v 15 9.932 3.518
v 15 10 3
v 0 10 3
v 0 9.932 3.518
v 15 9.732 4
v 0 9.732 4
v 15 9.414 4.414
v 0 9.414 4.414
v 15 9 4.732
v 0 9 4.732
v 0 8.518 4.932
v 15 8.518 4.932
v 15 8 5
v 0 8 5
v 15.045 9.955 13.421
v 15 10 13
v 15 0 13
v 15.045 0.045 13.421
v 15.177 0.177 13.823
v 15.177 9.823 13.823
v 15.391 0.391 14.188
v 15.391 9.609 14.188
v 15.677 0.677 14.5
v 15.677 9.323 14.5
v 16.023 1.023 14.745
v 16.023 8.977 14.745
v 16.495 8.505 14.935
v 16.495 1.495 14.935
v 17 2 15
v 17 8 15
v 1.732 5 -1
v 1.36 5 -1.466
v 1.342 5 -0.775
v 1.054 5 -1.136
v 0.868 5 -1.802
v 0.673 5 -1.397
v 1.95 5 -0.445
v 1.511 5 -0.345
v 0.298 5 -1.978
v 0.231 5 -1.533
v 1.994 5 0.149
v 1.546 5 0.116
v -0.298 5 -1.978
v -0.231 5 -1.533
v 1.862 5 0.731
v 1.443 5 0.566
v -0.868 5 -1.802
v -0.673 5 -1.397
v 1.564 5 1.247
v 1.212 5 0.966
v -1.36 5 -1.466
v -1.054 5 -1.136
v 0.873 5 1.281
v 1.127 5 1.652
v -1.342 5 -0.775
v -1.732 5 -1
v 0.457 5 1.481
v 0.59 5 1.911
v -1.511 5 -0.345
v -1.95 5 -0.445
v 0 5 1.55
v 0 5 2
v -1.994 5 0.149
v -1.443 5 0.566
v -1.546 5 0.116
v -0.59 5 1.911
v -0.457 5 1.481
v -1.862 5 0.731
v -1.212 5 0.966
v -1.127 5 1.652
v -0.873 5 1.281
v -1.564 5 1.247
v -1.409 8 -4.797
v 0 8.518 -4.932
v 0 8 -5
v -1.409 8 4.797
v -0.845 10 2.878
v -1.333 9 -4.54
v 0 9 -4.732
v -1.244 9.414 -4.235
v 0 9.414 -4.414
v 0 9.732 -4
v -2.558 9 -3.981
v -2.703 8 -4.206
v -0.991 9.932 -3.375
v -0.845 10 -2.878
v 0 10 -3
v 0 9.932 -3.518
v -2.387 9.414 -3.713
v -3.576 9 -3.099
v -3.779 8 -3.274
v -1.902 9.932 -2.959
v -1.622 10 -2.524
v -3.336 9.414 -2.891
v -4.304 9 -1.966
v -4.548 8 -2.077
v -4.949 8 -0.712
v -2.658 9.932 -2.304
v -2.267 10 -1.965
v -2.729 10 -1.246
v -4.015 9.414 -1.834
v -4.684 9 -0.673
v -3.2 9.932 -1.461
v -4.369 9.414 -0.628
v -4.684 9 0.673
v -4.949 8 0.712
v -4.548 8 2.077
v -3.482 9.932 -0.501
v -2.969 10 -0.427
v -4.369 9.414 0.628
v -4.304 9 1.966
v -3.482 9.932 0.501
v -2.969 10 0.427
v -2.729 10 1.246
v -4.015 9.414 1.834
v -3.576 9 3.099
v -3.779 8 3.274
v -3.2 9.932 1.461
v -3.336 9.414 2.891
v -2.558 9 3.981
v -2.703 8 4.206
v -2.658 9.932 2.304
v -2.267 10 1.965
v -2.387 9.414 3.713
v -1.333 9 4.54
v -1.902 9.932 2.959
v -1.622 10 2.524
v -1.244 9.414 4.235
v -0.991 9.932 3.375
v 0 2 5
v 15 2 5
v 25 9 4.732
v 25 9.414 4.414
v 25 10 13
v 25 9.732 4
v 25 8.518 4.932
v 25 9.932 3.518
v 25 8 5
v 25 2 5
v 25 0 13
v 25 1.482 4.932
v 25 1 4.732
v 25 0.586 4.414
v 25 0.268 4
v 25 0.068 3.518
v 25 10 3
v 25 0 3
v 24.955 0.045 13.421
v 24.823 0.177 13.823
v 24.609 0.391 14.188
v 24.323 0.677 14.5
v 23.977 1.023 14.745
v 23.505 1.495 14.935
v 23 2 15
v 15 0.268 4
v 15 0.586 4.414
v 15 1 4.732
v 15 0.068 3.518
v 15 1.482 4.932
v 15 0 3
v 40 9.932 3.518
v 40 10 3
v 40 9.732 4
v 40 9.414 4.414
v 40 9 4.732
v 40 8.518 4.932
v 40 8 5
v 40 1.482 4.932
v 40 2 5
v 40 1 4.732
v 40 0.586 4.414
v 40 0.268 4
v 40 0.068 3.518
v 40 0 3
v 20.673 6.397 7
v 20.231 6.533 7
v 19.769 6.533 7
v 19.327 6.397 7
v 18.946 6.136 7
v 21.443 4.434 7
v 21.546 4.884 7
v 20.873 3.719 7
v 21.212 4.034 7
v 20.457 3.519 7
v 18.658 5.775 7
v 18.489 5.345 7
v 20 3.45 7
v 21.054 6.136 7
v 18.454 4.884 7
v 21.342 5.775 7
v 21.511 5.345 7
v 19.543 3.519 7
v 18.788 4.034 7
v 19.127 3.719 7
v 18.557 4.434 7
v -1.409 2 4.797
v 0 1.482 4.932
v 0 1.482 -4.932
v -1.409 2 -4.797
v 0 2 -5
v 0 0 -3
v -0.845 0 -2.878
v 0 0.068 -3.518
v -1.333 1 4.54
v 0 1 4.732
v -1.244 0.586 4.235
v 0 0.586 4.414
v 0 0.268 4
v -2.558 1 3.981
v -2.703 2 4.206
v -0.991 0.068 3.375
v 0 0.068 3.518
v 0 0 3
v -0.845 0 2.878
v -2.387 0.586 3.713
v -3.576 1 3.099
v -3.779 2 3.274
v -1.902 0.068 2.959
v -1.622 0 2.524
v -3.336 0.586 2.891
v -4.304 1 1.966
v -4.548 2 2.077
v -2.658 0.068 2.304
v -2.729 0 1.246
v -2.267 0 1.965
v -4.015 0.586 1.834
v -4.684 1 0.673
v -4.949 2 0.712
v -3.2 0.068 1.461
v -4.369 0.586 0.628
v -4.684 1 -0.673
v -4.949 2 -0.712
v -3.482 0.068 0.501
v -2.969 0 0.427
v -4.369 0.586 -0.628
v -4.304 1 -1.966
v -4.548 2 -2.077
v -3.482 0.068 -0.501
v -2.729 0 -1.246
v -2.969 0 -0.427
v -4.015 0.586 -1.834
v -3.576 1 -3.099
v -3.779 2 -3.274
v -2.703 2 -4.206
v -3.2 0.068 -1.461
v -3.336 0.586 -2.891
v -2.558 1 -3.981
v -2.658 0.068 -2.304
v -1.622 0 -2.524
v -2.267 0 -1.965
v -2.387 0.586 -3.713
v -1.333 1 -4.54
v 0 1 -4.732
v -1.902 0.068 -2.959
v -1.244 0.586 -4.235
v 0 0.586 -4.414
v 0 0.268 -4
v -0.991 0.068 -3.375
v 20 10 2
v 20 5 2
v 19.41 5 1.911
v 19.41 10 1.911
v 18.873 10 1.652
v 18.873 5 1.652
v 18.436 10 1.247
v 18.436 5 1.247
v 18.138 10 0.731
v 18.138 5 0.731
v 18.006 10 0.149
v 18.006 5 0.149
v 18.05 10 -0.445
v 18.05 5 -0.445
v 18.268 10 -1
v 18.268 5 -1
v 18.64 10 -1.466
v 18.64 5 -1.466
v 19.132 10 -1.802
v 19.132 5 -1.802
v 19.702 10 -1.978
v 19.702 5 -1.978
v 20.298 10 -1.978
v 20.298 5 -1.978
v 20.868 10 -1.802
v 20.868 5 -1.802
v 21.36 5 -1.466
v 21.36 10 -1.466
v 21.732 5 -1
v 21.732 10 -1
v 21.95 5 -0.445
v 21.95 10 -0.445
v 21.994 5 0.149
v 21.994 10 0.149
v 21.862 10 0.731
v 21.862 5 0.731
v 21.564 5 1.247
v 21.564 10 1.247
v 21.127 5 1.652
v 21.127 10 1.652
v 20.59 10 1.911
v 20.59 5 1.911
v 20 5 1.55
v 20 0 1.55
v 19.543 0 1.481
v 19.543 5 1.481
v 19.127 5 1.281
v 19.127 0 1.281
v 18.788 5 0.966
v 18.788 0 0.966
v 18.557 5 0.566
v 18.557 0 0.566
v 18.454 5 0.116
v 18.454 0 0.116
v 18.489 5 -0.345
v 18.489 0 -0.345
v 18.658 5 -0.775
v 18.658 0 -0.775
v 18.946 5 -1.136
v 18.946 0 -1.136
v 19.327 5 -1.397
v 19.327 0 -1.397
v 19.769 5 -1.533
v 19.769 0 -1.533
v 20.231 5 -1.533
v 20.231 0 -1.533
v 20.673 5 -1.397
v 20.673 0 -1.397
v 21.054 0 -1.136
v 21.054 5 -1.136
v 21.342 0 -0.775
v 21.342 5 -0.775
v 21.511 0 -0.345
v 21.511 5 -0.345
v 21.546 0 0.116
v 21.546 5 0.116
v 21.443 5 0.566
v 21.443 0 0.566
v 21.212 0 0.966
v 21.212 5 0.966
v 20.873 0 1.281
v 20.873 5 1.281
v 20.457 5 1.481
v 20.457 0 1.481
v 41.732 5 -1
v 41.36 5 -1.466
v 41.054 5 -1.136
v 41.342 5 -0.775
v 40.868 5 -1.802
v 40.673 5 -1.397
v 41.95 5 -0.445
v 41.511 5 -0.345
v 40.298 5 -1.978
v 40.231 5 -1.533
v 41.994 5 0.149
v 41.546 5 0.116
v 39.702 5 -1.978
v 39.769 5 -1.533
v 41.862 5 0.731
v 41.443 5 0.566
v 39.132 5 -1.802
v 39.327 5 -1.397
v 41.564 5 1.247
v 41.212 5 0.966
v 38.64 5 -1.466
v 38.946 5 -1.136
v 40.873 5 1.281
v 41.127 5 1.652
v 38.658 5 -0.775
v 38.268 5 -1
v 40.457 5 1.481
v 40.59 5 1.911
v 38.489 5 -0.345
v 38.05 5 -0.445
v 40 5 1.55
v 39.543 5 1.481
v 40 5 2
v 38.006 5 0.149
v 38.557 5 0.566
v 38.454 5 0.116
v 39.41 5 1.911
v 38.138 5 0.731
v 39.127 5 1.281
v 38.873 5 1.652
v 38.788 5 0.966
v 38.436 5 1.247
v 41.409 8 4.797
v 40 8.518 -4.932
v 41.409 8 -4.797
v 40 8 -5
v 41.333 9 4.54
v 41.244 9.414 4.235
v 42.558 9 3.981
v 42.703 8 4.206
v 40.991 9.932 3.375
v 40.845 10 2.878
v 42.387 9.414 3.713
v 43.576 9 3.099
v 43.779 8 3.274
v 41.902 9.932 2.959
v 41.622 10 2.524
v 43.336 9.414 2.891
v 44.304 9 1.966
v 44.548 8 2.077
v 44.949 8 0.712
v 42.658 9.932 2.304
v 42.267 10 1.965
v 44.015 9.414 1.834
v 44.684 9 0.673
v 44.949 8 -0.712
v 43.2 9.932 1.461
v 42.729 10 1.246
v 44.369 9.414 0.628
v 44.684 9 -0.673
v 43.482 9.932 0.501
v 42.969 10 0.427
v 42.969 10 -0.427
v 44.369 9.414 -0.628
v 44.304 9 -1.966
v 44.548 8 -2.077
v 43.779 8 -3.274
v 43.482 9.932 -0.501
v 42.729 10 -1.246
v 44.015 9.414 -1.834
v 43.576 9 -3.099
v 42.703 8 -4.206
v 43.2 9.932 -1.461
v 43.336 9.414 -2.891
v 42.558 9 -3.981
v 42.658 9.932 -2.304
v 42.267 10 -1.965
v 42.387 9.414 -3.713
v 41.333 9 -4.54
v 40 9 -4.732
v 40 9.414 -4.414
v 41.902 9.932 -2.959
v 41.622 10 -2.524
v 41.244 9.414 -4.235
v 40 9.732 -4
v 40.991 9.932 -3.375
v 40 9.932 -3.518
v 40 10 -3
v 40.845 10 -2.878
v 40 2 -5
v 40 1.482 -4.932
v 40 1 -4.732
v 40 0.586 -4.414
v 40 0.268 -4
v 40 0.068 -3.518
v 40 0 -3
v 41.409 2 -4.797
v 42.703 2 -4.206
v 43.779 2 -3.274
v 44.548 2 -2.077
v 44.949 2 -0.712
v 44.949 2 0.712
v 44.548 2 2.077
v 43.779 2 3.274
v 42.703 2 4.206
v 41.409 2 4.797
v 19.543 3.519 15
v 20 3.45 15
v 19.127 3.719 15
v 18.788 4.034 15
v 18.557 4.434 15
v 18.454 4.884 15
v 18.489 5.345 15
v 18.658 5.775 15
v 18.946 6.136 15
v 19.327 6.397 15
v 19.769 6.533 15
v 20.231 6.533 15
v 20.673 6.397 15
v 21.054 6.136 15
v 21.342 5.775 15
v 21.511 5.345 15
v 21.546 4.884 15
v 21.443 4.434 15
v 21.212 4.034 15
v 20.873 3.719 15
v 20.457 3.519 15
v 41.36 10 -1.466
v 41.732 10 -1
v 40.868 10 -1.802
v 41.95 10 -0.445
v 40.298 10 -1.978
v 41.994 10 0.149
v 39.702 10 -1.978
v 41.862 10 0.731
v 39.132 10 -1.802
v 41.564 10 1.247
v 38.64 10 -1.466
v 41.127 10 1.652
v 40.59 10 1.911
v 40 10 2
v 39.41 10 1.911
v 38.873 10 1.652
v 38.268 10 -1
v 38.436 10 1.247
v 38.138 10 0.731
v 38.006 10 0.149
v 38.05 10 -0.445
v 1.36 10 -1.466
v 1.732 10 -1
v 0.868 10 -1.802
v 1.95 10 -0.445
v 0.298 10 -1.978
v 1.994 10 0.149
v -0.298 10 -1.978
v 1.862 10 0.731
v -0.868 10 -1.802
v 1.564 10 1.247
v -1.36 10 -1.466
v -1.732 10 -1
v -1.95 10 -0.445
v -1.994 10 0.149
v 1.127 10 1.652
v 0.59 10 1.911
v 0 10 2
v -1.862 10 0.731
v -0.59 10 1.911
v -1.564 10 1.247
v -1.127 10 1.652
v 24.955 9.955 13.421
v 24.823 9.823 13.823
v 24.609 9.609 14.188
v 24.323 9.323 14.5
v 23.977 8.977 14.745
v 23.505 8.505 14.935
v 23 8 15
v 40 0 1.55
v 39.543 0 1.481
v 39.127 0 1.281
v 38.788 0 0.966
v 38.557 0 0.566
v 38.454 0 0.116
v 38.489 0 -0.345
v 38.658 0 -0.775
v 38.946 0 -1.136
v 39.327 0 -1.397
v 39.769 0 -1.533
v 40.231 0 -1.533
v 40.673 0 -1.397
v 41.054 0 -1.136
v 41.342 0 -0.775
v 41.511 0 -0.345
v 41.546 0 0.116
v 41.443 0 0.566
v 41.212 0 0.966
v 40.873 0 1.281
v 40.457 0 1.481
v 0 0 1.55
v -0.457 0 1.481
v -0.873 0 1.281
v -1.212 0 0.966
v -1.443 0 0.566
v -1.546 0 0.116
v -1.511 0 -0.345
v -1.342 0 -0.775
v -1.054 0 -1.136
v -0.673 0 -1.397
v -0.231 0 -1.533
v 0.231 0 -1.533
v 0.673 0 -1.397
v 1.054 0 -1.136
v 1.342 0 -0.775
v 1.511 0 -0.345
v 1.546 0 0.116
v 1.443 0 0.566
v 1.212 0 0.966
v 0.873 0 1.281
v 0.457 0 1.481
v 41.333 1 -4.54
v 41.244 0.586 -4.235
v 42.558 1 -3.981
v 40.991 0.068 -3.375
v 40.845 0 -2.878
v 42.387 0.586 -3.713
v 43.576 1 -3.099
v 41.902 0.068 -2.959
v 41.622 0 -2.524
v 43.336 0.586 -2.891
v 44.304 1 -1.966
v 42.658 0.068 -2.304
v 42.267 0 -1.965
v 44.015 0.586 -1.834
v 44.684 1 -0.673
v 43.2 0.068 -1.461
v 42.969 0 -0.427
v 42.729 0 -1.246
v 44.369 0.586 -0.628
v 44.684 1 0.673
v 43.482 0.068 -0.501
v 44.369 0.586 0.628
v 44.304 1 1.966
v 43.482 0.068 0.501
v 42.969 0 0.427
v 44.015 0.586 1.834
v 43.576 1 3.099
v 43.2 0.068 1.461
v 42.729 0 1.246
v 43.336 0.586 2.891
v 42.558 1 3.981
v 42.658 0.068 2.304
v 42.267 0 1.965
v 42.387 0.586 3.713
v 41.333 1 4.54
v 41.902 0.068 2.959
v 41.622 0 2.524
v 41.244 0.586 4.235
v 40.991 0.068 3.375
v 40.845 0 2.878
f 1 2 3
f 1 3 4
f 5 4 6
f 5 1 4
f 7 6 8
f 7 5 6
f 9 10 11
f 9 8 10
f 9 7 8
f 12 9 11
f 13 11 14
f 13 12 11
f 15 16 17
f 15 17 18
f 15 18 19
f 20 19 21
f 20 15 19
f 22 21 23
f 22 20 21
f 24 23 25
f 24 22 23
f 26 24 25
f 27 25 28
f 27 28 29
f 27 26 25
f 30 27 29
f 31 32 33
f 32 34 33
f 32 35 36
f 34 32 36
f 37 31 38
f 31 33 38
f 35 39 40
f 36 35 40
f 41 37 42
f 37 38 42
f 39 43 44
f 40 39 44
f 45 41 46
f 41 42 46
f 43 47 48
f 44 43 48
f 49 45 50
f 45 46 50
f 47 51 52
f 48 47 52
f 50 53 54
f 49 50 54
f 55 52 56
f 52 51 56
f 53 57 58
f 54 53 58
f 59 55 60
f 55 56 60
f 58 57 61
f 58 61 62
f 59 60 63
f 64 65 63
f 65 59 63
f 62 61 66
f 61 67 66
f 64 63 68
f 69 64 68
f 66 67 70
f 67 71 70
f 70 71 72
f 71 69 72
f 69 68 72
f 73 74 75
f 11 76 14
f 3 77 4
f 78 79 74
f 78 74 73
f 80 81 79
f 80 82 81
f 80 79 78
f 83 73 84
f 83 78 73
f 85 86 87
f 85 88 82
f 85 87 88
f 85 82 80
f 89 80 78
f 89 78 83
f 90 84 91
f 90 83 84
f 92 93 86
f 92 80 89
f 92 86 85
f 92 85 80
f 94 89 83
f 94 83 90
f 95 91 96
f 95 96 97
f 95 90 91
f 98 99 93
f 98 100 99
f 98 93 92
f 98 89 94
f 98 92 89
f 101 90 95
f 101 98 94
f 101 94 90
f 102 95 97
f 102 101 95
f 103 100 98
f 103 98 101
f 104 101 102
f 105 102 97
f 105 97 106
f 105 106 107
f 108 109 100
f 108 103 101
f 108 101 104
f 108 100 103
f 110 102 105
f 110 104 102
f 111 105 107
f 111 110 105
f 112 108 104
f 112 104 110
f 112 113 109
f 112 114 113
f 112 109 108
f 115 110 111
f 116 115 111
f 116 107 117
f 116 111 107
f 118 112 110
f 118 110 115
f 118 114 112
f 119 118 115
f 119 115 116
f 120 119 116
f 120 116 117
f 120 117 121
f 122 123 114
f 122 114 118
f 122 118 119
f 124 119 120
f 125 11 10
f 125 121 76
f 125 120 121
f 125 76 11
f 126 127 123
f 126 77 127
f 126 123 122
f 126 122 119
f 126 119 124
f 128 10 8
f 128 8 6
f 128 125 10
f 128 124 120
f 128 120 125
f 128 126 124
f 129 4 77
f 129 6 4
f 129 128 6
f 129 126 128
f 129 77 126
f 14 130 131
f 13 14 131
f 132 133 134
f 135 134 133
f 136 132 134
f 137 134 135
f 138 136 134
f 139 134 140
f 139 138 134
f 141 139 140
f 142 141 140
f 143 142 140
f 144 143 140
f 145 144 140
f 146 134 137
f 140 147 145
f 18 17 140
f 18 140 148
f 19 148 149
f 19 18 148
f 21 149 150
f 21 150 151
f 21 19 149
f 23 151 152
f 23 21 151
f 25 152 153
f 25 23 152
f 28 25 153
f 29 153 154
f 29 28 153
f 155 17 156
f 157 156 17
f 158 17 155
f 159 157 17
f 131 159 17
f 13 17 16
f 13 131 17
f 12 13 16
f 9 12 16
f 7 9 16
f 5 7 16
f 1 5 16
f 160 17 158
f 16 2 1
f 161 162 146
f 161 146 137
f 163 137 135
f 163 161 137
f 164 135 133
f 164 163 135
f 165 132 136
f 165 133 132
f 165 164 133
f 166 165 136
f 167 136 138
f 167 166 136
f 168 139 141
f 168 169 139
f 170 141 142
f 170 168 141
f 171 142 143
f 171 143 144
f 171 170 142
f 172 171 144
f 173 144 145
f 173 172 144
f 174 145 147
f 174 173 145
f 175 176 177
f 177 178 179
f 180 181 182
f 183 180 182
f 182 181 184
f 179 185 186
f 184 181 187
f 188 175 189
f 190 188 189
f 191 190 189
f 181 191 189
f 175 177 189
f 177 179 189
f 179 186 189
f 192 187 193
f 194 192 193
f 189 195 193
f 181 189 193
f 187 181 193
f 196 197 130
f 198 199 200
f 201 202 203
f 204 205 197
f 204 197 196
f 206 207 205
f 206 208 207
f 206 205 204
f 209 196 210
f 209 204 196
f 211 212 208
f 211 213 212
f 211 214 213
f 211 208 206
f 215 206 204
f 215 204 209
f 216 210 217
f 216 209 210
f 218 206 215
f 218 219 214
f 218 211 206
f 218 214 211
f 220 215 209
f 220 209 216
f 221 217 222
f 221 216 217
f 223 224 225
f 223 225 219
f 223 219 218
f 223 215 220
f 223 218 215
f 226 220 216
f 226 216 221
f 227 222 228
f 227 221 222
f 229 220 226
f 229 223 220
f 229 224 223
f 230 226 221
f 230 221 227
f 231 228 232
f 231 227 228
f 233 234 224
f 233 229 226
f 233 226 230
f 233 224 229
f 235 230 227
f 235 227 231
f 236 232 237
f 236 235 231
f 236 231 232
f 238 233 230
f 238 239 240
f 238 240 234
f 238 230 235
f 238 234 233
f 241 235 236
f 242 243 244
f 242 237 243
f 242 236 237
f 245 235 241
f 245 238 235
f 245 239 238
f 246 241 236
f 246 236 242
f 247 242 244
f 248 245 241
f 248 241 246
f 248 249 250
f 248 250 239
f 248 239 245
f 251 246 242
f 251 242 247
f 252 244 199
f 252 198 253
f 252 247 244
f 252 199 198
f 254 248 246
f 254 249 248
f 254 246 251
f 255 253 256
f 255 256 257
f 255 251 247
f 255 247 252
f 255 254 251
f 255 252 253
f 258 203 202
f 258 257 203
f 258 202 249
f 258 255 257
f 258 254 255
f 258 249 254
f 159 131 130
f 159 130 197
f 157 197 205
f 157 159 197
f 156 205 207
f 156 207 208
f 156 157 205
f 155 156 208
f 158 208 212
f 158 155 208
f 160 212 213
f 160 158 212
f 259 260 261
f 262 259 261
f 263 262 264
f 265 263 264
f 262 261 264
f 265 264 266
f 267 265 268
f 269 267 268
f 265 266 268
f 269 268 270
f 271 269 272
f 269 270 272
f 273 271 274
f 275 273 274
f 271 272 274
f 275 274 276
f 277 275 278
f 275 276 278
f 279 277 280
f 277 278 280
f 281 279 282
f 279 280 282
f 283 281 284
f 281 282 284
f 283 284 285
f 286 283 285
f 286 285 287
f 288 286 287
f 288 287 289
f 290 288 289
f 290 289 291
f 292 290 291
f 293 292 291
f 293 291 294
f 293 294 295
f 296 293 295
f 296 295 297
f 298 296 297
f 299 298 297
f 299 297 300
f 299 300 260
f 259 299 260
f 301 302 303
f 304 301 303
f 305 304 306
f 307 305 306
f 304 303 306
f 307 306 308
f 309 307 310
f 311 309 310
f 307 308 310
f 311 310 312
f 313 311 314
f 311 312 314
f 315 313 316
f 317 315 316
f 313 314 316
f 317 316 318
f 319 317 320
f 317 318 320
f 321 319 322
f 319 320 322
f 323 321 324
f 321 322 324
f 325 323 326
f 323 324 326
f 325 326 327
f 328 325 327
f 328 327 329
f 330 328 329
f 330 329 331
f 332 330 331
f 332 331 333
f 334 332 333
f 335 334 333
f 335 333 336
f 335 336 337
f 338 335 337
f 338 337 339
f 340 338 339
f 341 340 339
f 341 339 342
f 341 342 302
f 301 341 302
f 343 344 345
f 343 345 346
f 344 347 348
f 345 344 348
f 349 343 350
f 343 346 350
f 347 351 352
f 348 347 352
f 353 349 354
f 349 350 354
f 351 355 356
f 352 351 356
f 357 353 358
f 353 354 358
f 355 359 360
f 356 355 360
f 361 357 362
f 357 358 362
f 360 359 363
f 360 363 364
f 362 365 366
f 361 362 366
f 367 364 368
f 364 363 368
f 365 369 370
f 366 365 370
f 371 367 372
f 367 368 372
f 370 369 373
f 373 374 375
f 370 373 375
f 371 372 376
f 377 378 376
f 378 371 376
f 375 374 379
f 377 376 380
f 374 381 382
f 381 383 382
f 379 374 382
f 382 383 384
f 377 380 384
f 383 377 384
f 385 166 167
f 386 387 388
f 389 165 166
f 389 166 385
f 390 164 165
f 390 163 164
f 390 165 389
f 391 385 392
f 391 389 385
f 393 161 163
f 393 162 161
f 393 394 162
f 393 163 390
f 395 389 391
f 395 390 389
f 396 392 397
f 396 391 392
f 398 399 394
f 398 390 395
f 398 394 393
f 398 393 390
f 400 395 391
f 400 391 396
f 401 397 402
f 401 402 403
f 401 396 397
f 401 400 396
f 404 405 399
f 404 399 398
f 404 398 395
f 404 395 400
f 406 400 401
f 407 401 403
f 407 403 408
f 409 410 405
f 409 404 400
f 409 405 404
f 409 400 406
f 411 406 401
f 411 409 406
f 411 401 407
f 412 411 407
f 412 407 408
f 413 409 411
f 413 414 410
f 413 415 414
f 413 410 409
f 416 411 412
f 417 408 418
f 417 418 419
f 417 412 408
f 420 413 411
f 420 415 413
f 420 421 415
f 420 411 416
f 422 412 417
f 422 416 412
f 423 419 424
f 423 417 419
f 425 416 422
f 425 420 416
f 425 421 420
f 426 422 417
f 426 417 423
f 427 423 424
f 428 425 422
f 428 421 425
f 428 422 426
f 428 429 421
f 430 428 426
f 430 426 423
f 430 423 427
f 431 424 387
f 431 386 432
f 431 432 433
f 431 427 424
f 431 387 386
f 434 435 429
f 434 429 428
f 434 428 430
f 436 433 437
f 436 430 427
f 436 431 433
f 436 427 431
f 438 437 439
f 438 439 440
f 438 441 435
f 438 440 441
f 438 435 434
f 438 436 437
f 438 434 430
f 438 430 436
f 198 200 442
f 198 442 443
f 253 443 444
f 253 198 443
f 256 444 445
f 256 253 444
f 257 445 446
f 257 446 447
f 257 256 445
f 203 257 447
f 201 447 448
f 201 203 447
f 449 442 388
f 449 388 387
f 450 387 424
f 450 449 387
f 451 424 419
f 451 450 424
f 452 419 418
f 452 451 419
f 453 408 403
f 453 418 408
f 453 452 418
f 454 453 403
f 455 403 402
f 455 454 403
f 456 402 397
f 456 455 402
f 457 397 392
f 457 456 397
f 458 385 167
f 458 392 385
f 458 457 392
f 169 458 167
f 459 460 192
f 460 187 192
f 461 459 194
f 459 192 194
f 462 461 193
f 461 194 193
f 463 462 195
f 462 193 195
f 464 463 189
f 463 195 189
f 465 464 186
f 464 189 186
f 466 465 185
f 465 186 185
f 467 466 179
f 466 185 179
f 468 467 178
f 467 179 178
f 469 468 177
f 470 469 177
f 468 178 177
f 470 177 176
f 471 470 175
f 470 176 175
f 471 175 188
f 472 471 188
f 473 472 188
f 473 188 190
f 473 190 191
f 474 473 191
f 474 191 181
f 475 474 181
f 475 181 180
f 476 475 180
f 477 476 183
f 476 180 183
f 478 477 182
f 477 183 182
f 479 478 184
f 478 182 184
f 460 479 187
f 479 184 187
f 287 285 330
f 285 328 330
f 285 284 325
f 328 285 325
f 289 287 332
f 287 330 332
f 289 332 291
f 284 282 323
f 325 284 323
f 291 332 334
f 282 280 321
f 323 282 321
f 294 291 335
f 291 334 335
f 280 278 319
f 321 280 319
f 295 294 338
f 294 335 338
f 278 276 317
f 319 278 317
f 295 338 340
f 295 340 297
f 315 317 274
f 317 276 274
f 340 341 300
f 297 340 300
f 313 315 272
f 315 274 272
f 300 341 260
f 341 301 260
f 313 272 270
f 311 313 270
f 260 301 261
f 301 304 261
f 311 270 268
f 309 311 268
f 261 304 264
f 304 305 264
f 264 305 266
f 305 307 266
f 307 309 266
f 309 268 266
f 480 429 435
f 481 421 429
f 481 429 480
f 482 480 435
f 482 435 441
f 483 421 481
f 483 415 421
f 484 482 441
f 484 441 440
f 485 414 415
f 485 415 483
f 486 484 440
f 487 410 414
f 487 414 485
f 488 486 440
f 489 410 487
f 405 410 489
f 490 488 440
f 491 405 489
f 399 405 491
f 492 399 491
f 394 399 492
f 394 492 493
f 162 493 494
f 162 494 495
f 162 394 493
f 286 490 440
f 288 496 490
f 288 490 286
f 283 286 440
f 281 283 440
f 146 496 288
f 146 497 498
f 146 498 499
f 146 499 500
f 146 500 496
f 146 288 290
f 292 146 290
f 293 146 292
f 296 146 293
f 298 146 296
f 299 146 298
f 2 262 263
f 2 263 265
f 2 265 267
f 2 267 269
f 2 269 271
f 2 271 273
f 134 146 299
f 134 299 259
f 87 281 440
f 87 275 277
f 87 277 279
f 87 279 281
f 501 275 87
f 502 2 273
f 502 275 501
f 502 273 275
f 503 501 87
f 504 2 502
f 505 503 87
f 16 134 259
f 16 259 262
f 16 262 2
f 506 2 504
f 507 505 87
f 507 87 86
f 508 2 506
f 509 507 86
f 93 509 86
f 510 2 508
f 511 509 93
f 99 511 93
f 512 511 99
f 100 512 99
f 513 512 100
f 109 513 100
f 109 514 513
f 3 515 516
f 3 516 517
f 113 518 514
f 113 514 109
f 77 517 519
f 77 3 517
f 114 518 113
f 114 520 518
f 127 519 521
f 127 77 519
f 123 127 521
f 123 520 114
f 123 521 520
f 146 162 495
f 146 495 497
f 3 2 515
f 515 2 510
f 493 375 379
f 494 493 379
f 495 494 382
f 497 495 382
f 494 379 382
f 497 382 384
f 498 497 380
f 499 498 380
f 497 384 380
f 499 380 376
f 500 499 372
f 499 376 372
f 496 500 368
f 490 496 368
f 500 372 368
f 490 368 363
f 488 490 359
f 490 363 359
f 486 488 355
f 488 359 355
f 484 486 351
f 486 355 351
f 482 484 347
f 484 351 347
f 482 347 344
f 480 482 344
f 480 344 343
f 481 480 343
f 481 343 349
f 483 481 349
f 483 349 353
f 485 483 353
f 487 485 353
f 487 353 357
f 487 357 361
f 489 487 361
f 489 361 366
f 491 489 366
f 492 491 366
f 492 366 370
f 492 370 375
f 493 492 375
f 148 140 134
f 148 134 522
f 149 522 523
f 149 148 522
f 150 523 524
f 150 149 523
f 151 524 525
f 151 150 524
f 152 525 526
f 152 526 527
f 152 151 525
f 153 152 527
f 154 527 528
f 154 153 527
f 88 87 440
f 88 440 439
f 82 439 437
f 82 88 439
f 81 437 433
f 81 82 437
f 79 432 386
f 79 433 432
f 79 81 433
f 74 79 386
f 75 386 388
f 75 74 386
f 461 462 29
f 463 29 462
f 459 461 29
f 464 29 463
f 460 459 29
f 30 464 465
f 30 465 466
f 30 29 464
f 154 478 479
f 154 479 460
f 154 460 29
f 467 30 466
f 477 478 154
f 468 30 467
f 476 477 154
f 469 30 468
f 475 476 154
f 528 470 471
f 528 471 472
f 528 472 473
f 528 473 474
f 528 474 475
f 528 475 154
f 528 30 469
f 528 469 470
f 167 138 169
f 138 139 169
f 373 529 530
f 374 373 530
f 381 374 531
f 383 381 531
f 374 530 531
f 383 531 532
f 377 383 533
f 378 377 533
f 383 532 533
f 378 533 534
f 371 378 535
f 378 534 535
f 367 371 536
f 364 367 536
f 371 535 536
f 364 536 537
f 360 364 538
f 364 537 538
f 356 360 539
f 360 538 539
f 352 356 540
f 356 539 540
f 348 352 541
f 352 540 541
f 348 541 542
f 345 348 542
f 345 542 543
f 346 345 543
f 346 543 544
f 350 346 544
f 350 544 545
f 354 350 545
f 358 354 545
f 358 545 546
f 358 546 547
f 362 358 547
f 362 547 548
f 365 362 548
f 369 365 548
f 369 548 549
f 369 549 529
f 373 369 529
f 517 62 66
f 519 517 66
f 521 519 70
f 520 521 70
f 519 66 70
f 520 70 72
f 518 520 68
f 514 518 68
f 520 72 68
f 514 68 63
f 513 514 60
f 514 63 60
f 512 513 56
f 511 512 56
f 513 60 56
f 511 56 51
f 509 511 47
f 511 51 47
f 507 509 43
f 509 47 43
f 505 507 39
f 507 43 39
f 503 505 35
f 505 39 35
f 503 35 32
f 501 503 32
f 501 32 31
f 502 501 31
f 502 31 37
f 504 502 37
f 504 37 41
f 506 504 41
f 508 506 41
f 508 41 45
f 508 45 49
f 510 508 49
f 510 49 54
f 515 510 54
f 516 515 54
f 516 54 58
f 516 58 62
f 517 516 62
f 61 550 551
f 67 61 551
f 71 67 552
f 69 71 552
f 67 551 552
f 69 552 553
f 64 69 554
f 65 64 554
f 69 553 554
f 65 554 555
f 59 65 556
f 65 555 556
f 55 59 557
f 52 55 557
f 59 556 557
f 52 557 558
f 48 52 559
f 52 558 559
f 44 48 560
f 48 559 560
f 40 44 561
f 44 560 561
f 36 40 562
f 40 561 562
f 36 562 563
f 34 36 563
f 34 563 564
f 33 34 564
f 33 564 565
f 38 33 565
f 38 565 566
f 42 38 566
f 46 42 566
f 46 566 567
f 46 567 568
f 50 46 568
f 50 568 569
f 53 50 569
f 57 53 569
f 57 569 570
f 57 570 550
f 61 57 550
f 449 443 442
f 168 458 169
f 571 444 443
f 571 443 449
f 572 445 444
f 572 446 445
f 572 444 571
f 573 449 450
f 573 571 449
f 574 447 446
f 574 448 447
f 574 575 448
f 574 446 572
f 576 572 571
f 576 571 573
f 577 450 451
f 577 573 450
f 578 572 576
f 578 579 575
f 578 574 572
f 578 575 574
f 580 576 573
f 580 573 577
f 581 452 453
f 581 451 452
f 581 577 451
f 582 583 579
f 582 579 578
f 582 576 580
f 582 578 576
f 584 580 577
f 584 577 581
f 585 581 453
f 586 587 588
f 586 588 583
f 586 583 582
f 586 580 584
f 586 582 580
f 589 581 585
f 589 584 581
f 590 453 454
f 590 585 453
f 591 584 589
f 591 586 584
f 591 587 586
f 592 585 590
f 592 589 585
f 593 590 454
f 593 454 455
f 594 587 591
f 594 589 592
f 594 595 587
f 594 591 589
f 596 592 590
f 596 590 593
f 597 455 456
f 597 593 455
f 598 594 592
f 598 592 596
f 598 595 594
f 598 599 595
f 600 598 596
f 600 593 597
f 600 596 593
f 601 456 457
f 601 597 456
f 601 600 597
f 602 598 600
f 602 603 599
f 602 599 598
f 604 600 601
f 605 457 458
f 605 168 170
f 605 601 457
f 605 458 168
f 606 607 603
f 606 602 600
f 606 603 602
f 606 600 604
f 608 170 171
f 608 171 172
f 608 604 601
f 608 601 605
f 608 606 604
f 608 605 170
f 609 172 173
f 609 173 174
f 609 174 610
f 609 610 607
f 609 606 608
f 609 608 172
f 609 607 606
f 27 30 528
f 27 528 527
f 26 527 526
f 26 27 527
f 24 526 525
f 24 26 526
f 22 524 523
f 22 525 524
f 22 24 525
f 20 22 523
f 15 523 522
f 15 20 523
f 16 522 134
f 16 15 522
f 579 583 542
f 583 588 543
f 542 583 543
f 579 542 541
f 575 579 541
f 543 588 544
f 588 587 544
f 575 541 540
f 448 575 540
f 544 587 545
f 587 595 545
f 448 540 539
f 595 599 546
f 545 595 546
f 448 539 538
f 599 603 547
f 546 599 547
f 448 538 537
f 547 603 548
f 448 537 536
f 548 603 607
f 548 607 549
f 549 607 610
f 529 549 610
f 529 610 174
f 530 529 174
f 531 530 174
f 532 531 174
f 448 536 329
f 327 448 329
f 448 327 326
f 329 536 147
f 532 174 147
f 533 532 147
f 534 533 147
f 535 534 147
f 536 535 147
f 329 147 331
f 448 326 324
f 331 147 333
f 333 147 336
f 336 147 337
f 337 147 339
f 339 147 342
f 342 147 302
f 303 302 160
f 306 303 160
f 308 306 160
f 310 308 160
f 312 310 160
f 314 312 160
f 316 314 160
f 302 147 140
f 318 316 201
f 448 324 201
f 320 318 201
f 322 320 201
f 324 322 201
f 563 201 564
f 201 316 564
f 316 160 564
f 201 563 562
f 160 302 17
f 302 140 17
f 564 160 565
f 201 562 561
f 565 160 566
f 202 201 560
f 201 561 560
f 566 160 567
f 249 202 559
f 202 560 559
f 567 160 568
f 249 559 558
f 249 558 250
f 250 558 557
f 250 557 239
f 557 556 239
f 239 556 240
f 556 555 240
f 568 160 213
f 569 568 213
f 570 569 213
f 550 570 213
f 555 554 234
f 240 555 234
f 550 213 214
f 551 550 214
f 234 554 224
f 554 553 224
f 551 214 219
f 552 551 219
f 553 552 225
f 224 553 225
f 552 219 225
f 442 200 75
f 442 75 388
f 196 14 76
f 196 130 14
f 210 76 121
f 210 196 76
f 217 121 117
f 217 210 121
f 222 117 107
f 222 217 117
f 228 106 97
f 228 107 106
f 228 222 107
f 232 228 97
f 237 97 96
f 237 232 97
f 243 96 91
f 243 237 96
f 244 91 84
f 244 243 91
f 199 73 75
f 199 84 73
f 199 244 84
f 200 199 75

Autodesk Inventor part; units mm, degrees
ref_plane "YZ Plane" through (0, 0, 0) normal (1, 0, 0) x (0, 1, 0)
ref_plane "XZ Plane" through (0, 0, 0) normal (0, 1, 0) x (-1, 0, 0)
ref_plane "XY Plane" through (0, 0, 0) normal (0, 0, 1) x (1, 0, 0)
sketch "Sketch1" plane through (0, 0, 0) normal (0, 1, 0) x (-1, 0, 0)
  arc A0 (0, -5) -> (0, 5) centre (0, 0) ccw
  arc A1 (-40, 5) -> (-40, -5) centre (-40, 0) ccw
  line L0 (0, 5) -> (-40, 5)
  line L1 (0, -5) -> (-40, -5)
  dimension "d2" = 40
extrude "Extrusion1" add sketch "Sketch1" along normal blind 10
sketch "Sketch2" plane through (0, 10, 0) normal (0, 1, 0) x (1, 0, 0)
  point P0 (0, 0)
hole "Hole1" at (0, 10, 0) direction (0, -1, 0) diameter 3.1 end through all counterbore diameter 4 counterbore depth 5
sketch "Sketch3" plane through (0, 10, 0) normal (0, 1, 0) x (1, 0, 0)
  arc A0 (40, -5) -> (40, 5) centre (40, 0) ccw projected
  point P0 (0, 0)
  point P1 (20, 0)
hole "Hole2" at (40, 10, 0) at (20, 10, 0) direction (0, -1, 0) diameter 3.1 end through all counterbore diameter 4 counterbore depth 5
sketch "Sketch4" plane through (0, 0, 5) normal (0, 0, 1) x (1, 0, 0)
  line L0 (21.55, 5) -> (18.45, 5) projected
  line L1 (40, 10) -> (0, 10) projected
  line L2 (40, 0) -> (0, 0) projected
  line L3 (15, 10) -> (25, 10)
  line L4 (25, 10) -> (25, 0)
  line L5 (25, 0) -> (15, 0)
  line L6 (15, 0) -> (15, 10)
  point P0 (20, 5)
  dimension "d19" = 10
  dimension "d20" = 5
extrude "Extrusion2" add sketch "Sketch4" along normal blind 10
fillet "Fillet1" radius 2 14 edges at (20, 10, 15) (15, 5, 15) (20, 0, 15) (25, 5, 15) (-5, 10, 0) (20, 10, -5) (45, 10, 0) (32.5, 10, 5) (7.5, 10, 5) (-5, 0, 0) (20, 0, -5) (45, 0, 0) (32.5, 0, 5) (7.5, 0, 5)
sketch "Sketch5" plane through (0, 0, 15) normal (0, 0, 1) x (1, 0, 0)
  line L0 (21.55, 5) -> (18.45, 5) projected
  point P0 (0, 0)
  point P1 (20, 5)
hole "Hole3" at (20, 5, 15) direction (0, 0, -1) diameter 3.1 depth 8
